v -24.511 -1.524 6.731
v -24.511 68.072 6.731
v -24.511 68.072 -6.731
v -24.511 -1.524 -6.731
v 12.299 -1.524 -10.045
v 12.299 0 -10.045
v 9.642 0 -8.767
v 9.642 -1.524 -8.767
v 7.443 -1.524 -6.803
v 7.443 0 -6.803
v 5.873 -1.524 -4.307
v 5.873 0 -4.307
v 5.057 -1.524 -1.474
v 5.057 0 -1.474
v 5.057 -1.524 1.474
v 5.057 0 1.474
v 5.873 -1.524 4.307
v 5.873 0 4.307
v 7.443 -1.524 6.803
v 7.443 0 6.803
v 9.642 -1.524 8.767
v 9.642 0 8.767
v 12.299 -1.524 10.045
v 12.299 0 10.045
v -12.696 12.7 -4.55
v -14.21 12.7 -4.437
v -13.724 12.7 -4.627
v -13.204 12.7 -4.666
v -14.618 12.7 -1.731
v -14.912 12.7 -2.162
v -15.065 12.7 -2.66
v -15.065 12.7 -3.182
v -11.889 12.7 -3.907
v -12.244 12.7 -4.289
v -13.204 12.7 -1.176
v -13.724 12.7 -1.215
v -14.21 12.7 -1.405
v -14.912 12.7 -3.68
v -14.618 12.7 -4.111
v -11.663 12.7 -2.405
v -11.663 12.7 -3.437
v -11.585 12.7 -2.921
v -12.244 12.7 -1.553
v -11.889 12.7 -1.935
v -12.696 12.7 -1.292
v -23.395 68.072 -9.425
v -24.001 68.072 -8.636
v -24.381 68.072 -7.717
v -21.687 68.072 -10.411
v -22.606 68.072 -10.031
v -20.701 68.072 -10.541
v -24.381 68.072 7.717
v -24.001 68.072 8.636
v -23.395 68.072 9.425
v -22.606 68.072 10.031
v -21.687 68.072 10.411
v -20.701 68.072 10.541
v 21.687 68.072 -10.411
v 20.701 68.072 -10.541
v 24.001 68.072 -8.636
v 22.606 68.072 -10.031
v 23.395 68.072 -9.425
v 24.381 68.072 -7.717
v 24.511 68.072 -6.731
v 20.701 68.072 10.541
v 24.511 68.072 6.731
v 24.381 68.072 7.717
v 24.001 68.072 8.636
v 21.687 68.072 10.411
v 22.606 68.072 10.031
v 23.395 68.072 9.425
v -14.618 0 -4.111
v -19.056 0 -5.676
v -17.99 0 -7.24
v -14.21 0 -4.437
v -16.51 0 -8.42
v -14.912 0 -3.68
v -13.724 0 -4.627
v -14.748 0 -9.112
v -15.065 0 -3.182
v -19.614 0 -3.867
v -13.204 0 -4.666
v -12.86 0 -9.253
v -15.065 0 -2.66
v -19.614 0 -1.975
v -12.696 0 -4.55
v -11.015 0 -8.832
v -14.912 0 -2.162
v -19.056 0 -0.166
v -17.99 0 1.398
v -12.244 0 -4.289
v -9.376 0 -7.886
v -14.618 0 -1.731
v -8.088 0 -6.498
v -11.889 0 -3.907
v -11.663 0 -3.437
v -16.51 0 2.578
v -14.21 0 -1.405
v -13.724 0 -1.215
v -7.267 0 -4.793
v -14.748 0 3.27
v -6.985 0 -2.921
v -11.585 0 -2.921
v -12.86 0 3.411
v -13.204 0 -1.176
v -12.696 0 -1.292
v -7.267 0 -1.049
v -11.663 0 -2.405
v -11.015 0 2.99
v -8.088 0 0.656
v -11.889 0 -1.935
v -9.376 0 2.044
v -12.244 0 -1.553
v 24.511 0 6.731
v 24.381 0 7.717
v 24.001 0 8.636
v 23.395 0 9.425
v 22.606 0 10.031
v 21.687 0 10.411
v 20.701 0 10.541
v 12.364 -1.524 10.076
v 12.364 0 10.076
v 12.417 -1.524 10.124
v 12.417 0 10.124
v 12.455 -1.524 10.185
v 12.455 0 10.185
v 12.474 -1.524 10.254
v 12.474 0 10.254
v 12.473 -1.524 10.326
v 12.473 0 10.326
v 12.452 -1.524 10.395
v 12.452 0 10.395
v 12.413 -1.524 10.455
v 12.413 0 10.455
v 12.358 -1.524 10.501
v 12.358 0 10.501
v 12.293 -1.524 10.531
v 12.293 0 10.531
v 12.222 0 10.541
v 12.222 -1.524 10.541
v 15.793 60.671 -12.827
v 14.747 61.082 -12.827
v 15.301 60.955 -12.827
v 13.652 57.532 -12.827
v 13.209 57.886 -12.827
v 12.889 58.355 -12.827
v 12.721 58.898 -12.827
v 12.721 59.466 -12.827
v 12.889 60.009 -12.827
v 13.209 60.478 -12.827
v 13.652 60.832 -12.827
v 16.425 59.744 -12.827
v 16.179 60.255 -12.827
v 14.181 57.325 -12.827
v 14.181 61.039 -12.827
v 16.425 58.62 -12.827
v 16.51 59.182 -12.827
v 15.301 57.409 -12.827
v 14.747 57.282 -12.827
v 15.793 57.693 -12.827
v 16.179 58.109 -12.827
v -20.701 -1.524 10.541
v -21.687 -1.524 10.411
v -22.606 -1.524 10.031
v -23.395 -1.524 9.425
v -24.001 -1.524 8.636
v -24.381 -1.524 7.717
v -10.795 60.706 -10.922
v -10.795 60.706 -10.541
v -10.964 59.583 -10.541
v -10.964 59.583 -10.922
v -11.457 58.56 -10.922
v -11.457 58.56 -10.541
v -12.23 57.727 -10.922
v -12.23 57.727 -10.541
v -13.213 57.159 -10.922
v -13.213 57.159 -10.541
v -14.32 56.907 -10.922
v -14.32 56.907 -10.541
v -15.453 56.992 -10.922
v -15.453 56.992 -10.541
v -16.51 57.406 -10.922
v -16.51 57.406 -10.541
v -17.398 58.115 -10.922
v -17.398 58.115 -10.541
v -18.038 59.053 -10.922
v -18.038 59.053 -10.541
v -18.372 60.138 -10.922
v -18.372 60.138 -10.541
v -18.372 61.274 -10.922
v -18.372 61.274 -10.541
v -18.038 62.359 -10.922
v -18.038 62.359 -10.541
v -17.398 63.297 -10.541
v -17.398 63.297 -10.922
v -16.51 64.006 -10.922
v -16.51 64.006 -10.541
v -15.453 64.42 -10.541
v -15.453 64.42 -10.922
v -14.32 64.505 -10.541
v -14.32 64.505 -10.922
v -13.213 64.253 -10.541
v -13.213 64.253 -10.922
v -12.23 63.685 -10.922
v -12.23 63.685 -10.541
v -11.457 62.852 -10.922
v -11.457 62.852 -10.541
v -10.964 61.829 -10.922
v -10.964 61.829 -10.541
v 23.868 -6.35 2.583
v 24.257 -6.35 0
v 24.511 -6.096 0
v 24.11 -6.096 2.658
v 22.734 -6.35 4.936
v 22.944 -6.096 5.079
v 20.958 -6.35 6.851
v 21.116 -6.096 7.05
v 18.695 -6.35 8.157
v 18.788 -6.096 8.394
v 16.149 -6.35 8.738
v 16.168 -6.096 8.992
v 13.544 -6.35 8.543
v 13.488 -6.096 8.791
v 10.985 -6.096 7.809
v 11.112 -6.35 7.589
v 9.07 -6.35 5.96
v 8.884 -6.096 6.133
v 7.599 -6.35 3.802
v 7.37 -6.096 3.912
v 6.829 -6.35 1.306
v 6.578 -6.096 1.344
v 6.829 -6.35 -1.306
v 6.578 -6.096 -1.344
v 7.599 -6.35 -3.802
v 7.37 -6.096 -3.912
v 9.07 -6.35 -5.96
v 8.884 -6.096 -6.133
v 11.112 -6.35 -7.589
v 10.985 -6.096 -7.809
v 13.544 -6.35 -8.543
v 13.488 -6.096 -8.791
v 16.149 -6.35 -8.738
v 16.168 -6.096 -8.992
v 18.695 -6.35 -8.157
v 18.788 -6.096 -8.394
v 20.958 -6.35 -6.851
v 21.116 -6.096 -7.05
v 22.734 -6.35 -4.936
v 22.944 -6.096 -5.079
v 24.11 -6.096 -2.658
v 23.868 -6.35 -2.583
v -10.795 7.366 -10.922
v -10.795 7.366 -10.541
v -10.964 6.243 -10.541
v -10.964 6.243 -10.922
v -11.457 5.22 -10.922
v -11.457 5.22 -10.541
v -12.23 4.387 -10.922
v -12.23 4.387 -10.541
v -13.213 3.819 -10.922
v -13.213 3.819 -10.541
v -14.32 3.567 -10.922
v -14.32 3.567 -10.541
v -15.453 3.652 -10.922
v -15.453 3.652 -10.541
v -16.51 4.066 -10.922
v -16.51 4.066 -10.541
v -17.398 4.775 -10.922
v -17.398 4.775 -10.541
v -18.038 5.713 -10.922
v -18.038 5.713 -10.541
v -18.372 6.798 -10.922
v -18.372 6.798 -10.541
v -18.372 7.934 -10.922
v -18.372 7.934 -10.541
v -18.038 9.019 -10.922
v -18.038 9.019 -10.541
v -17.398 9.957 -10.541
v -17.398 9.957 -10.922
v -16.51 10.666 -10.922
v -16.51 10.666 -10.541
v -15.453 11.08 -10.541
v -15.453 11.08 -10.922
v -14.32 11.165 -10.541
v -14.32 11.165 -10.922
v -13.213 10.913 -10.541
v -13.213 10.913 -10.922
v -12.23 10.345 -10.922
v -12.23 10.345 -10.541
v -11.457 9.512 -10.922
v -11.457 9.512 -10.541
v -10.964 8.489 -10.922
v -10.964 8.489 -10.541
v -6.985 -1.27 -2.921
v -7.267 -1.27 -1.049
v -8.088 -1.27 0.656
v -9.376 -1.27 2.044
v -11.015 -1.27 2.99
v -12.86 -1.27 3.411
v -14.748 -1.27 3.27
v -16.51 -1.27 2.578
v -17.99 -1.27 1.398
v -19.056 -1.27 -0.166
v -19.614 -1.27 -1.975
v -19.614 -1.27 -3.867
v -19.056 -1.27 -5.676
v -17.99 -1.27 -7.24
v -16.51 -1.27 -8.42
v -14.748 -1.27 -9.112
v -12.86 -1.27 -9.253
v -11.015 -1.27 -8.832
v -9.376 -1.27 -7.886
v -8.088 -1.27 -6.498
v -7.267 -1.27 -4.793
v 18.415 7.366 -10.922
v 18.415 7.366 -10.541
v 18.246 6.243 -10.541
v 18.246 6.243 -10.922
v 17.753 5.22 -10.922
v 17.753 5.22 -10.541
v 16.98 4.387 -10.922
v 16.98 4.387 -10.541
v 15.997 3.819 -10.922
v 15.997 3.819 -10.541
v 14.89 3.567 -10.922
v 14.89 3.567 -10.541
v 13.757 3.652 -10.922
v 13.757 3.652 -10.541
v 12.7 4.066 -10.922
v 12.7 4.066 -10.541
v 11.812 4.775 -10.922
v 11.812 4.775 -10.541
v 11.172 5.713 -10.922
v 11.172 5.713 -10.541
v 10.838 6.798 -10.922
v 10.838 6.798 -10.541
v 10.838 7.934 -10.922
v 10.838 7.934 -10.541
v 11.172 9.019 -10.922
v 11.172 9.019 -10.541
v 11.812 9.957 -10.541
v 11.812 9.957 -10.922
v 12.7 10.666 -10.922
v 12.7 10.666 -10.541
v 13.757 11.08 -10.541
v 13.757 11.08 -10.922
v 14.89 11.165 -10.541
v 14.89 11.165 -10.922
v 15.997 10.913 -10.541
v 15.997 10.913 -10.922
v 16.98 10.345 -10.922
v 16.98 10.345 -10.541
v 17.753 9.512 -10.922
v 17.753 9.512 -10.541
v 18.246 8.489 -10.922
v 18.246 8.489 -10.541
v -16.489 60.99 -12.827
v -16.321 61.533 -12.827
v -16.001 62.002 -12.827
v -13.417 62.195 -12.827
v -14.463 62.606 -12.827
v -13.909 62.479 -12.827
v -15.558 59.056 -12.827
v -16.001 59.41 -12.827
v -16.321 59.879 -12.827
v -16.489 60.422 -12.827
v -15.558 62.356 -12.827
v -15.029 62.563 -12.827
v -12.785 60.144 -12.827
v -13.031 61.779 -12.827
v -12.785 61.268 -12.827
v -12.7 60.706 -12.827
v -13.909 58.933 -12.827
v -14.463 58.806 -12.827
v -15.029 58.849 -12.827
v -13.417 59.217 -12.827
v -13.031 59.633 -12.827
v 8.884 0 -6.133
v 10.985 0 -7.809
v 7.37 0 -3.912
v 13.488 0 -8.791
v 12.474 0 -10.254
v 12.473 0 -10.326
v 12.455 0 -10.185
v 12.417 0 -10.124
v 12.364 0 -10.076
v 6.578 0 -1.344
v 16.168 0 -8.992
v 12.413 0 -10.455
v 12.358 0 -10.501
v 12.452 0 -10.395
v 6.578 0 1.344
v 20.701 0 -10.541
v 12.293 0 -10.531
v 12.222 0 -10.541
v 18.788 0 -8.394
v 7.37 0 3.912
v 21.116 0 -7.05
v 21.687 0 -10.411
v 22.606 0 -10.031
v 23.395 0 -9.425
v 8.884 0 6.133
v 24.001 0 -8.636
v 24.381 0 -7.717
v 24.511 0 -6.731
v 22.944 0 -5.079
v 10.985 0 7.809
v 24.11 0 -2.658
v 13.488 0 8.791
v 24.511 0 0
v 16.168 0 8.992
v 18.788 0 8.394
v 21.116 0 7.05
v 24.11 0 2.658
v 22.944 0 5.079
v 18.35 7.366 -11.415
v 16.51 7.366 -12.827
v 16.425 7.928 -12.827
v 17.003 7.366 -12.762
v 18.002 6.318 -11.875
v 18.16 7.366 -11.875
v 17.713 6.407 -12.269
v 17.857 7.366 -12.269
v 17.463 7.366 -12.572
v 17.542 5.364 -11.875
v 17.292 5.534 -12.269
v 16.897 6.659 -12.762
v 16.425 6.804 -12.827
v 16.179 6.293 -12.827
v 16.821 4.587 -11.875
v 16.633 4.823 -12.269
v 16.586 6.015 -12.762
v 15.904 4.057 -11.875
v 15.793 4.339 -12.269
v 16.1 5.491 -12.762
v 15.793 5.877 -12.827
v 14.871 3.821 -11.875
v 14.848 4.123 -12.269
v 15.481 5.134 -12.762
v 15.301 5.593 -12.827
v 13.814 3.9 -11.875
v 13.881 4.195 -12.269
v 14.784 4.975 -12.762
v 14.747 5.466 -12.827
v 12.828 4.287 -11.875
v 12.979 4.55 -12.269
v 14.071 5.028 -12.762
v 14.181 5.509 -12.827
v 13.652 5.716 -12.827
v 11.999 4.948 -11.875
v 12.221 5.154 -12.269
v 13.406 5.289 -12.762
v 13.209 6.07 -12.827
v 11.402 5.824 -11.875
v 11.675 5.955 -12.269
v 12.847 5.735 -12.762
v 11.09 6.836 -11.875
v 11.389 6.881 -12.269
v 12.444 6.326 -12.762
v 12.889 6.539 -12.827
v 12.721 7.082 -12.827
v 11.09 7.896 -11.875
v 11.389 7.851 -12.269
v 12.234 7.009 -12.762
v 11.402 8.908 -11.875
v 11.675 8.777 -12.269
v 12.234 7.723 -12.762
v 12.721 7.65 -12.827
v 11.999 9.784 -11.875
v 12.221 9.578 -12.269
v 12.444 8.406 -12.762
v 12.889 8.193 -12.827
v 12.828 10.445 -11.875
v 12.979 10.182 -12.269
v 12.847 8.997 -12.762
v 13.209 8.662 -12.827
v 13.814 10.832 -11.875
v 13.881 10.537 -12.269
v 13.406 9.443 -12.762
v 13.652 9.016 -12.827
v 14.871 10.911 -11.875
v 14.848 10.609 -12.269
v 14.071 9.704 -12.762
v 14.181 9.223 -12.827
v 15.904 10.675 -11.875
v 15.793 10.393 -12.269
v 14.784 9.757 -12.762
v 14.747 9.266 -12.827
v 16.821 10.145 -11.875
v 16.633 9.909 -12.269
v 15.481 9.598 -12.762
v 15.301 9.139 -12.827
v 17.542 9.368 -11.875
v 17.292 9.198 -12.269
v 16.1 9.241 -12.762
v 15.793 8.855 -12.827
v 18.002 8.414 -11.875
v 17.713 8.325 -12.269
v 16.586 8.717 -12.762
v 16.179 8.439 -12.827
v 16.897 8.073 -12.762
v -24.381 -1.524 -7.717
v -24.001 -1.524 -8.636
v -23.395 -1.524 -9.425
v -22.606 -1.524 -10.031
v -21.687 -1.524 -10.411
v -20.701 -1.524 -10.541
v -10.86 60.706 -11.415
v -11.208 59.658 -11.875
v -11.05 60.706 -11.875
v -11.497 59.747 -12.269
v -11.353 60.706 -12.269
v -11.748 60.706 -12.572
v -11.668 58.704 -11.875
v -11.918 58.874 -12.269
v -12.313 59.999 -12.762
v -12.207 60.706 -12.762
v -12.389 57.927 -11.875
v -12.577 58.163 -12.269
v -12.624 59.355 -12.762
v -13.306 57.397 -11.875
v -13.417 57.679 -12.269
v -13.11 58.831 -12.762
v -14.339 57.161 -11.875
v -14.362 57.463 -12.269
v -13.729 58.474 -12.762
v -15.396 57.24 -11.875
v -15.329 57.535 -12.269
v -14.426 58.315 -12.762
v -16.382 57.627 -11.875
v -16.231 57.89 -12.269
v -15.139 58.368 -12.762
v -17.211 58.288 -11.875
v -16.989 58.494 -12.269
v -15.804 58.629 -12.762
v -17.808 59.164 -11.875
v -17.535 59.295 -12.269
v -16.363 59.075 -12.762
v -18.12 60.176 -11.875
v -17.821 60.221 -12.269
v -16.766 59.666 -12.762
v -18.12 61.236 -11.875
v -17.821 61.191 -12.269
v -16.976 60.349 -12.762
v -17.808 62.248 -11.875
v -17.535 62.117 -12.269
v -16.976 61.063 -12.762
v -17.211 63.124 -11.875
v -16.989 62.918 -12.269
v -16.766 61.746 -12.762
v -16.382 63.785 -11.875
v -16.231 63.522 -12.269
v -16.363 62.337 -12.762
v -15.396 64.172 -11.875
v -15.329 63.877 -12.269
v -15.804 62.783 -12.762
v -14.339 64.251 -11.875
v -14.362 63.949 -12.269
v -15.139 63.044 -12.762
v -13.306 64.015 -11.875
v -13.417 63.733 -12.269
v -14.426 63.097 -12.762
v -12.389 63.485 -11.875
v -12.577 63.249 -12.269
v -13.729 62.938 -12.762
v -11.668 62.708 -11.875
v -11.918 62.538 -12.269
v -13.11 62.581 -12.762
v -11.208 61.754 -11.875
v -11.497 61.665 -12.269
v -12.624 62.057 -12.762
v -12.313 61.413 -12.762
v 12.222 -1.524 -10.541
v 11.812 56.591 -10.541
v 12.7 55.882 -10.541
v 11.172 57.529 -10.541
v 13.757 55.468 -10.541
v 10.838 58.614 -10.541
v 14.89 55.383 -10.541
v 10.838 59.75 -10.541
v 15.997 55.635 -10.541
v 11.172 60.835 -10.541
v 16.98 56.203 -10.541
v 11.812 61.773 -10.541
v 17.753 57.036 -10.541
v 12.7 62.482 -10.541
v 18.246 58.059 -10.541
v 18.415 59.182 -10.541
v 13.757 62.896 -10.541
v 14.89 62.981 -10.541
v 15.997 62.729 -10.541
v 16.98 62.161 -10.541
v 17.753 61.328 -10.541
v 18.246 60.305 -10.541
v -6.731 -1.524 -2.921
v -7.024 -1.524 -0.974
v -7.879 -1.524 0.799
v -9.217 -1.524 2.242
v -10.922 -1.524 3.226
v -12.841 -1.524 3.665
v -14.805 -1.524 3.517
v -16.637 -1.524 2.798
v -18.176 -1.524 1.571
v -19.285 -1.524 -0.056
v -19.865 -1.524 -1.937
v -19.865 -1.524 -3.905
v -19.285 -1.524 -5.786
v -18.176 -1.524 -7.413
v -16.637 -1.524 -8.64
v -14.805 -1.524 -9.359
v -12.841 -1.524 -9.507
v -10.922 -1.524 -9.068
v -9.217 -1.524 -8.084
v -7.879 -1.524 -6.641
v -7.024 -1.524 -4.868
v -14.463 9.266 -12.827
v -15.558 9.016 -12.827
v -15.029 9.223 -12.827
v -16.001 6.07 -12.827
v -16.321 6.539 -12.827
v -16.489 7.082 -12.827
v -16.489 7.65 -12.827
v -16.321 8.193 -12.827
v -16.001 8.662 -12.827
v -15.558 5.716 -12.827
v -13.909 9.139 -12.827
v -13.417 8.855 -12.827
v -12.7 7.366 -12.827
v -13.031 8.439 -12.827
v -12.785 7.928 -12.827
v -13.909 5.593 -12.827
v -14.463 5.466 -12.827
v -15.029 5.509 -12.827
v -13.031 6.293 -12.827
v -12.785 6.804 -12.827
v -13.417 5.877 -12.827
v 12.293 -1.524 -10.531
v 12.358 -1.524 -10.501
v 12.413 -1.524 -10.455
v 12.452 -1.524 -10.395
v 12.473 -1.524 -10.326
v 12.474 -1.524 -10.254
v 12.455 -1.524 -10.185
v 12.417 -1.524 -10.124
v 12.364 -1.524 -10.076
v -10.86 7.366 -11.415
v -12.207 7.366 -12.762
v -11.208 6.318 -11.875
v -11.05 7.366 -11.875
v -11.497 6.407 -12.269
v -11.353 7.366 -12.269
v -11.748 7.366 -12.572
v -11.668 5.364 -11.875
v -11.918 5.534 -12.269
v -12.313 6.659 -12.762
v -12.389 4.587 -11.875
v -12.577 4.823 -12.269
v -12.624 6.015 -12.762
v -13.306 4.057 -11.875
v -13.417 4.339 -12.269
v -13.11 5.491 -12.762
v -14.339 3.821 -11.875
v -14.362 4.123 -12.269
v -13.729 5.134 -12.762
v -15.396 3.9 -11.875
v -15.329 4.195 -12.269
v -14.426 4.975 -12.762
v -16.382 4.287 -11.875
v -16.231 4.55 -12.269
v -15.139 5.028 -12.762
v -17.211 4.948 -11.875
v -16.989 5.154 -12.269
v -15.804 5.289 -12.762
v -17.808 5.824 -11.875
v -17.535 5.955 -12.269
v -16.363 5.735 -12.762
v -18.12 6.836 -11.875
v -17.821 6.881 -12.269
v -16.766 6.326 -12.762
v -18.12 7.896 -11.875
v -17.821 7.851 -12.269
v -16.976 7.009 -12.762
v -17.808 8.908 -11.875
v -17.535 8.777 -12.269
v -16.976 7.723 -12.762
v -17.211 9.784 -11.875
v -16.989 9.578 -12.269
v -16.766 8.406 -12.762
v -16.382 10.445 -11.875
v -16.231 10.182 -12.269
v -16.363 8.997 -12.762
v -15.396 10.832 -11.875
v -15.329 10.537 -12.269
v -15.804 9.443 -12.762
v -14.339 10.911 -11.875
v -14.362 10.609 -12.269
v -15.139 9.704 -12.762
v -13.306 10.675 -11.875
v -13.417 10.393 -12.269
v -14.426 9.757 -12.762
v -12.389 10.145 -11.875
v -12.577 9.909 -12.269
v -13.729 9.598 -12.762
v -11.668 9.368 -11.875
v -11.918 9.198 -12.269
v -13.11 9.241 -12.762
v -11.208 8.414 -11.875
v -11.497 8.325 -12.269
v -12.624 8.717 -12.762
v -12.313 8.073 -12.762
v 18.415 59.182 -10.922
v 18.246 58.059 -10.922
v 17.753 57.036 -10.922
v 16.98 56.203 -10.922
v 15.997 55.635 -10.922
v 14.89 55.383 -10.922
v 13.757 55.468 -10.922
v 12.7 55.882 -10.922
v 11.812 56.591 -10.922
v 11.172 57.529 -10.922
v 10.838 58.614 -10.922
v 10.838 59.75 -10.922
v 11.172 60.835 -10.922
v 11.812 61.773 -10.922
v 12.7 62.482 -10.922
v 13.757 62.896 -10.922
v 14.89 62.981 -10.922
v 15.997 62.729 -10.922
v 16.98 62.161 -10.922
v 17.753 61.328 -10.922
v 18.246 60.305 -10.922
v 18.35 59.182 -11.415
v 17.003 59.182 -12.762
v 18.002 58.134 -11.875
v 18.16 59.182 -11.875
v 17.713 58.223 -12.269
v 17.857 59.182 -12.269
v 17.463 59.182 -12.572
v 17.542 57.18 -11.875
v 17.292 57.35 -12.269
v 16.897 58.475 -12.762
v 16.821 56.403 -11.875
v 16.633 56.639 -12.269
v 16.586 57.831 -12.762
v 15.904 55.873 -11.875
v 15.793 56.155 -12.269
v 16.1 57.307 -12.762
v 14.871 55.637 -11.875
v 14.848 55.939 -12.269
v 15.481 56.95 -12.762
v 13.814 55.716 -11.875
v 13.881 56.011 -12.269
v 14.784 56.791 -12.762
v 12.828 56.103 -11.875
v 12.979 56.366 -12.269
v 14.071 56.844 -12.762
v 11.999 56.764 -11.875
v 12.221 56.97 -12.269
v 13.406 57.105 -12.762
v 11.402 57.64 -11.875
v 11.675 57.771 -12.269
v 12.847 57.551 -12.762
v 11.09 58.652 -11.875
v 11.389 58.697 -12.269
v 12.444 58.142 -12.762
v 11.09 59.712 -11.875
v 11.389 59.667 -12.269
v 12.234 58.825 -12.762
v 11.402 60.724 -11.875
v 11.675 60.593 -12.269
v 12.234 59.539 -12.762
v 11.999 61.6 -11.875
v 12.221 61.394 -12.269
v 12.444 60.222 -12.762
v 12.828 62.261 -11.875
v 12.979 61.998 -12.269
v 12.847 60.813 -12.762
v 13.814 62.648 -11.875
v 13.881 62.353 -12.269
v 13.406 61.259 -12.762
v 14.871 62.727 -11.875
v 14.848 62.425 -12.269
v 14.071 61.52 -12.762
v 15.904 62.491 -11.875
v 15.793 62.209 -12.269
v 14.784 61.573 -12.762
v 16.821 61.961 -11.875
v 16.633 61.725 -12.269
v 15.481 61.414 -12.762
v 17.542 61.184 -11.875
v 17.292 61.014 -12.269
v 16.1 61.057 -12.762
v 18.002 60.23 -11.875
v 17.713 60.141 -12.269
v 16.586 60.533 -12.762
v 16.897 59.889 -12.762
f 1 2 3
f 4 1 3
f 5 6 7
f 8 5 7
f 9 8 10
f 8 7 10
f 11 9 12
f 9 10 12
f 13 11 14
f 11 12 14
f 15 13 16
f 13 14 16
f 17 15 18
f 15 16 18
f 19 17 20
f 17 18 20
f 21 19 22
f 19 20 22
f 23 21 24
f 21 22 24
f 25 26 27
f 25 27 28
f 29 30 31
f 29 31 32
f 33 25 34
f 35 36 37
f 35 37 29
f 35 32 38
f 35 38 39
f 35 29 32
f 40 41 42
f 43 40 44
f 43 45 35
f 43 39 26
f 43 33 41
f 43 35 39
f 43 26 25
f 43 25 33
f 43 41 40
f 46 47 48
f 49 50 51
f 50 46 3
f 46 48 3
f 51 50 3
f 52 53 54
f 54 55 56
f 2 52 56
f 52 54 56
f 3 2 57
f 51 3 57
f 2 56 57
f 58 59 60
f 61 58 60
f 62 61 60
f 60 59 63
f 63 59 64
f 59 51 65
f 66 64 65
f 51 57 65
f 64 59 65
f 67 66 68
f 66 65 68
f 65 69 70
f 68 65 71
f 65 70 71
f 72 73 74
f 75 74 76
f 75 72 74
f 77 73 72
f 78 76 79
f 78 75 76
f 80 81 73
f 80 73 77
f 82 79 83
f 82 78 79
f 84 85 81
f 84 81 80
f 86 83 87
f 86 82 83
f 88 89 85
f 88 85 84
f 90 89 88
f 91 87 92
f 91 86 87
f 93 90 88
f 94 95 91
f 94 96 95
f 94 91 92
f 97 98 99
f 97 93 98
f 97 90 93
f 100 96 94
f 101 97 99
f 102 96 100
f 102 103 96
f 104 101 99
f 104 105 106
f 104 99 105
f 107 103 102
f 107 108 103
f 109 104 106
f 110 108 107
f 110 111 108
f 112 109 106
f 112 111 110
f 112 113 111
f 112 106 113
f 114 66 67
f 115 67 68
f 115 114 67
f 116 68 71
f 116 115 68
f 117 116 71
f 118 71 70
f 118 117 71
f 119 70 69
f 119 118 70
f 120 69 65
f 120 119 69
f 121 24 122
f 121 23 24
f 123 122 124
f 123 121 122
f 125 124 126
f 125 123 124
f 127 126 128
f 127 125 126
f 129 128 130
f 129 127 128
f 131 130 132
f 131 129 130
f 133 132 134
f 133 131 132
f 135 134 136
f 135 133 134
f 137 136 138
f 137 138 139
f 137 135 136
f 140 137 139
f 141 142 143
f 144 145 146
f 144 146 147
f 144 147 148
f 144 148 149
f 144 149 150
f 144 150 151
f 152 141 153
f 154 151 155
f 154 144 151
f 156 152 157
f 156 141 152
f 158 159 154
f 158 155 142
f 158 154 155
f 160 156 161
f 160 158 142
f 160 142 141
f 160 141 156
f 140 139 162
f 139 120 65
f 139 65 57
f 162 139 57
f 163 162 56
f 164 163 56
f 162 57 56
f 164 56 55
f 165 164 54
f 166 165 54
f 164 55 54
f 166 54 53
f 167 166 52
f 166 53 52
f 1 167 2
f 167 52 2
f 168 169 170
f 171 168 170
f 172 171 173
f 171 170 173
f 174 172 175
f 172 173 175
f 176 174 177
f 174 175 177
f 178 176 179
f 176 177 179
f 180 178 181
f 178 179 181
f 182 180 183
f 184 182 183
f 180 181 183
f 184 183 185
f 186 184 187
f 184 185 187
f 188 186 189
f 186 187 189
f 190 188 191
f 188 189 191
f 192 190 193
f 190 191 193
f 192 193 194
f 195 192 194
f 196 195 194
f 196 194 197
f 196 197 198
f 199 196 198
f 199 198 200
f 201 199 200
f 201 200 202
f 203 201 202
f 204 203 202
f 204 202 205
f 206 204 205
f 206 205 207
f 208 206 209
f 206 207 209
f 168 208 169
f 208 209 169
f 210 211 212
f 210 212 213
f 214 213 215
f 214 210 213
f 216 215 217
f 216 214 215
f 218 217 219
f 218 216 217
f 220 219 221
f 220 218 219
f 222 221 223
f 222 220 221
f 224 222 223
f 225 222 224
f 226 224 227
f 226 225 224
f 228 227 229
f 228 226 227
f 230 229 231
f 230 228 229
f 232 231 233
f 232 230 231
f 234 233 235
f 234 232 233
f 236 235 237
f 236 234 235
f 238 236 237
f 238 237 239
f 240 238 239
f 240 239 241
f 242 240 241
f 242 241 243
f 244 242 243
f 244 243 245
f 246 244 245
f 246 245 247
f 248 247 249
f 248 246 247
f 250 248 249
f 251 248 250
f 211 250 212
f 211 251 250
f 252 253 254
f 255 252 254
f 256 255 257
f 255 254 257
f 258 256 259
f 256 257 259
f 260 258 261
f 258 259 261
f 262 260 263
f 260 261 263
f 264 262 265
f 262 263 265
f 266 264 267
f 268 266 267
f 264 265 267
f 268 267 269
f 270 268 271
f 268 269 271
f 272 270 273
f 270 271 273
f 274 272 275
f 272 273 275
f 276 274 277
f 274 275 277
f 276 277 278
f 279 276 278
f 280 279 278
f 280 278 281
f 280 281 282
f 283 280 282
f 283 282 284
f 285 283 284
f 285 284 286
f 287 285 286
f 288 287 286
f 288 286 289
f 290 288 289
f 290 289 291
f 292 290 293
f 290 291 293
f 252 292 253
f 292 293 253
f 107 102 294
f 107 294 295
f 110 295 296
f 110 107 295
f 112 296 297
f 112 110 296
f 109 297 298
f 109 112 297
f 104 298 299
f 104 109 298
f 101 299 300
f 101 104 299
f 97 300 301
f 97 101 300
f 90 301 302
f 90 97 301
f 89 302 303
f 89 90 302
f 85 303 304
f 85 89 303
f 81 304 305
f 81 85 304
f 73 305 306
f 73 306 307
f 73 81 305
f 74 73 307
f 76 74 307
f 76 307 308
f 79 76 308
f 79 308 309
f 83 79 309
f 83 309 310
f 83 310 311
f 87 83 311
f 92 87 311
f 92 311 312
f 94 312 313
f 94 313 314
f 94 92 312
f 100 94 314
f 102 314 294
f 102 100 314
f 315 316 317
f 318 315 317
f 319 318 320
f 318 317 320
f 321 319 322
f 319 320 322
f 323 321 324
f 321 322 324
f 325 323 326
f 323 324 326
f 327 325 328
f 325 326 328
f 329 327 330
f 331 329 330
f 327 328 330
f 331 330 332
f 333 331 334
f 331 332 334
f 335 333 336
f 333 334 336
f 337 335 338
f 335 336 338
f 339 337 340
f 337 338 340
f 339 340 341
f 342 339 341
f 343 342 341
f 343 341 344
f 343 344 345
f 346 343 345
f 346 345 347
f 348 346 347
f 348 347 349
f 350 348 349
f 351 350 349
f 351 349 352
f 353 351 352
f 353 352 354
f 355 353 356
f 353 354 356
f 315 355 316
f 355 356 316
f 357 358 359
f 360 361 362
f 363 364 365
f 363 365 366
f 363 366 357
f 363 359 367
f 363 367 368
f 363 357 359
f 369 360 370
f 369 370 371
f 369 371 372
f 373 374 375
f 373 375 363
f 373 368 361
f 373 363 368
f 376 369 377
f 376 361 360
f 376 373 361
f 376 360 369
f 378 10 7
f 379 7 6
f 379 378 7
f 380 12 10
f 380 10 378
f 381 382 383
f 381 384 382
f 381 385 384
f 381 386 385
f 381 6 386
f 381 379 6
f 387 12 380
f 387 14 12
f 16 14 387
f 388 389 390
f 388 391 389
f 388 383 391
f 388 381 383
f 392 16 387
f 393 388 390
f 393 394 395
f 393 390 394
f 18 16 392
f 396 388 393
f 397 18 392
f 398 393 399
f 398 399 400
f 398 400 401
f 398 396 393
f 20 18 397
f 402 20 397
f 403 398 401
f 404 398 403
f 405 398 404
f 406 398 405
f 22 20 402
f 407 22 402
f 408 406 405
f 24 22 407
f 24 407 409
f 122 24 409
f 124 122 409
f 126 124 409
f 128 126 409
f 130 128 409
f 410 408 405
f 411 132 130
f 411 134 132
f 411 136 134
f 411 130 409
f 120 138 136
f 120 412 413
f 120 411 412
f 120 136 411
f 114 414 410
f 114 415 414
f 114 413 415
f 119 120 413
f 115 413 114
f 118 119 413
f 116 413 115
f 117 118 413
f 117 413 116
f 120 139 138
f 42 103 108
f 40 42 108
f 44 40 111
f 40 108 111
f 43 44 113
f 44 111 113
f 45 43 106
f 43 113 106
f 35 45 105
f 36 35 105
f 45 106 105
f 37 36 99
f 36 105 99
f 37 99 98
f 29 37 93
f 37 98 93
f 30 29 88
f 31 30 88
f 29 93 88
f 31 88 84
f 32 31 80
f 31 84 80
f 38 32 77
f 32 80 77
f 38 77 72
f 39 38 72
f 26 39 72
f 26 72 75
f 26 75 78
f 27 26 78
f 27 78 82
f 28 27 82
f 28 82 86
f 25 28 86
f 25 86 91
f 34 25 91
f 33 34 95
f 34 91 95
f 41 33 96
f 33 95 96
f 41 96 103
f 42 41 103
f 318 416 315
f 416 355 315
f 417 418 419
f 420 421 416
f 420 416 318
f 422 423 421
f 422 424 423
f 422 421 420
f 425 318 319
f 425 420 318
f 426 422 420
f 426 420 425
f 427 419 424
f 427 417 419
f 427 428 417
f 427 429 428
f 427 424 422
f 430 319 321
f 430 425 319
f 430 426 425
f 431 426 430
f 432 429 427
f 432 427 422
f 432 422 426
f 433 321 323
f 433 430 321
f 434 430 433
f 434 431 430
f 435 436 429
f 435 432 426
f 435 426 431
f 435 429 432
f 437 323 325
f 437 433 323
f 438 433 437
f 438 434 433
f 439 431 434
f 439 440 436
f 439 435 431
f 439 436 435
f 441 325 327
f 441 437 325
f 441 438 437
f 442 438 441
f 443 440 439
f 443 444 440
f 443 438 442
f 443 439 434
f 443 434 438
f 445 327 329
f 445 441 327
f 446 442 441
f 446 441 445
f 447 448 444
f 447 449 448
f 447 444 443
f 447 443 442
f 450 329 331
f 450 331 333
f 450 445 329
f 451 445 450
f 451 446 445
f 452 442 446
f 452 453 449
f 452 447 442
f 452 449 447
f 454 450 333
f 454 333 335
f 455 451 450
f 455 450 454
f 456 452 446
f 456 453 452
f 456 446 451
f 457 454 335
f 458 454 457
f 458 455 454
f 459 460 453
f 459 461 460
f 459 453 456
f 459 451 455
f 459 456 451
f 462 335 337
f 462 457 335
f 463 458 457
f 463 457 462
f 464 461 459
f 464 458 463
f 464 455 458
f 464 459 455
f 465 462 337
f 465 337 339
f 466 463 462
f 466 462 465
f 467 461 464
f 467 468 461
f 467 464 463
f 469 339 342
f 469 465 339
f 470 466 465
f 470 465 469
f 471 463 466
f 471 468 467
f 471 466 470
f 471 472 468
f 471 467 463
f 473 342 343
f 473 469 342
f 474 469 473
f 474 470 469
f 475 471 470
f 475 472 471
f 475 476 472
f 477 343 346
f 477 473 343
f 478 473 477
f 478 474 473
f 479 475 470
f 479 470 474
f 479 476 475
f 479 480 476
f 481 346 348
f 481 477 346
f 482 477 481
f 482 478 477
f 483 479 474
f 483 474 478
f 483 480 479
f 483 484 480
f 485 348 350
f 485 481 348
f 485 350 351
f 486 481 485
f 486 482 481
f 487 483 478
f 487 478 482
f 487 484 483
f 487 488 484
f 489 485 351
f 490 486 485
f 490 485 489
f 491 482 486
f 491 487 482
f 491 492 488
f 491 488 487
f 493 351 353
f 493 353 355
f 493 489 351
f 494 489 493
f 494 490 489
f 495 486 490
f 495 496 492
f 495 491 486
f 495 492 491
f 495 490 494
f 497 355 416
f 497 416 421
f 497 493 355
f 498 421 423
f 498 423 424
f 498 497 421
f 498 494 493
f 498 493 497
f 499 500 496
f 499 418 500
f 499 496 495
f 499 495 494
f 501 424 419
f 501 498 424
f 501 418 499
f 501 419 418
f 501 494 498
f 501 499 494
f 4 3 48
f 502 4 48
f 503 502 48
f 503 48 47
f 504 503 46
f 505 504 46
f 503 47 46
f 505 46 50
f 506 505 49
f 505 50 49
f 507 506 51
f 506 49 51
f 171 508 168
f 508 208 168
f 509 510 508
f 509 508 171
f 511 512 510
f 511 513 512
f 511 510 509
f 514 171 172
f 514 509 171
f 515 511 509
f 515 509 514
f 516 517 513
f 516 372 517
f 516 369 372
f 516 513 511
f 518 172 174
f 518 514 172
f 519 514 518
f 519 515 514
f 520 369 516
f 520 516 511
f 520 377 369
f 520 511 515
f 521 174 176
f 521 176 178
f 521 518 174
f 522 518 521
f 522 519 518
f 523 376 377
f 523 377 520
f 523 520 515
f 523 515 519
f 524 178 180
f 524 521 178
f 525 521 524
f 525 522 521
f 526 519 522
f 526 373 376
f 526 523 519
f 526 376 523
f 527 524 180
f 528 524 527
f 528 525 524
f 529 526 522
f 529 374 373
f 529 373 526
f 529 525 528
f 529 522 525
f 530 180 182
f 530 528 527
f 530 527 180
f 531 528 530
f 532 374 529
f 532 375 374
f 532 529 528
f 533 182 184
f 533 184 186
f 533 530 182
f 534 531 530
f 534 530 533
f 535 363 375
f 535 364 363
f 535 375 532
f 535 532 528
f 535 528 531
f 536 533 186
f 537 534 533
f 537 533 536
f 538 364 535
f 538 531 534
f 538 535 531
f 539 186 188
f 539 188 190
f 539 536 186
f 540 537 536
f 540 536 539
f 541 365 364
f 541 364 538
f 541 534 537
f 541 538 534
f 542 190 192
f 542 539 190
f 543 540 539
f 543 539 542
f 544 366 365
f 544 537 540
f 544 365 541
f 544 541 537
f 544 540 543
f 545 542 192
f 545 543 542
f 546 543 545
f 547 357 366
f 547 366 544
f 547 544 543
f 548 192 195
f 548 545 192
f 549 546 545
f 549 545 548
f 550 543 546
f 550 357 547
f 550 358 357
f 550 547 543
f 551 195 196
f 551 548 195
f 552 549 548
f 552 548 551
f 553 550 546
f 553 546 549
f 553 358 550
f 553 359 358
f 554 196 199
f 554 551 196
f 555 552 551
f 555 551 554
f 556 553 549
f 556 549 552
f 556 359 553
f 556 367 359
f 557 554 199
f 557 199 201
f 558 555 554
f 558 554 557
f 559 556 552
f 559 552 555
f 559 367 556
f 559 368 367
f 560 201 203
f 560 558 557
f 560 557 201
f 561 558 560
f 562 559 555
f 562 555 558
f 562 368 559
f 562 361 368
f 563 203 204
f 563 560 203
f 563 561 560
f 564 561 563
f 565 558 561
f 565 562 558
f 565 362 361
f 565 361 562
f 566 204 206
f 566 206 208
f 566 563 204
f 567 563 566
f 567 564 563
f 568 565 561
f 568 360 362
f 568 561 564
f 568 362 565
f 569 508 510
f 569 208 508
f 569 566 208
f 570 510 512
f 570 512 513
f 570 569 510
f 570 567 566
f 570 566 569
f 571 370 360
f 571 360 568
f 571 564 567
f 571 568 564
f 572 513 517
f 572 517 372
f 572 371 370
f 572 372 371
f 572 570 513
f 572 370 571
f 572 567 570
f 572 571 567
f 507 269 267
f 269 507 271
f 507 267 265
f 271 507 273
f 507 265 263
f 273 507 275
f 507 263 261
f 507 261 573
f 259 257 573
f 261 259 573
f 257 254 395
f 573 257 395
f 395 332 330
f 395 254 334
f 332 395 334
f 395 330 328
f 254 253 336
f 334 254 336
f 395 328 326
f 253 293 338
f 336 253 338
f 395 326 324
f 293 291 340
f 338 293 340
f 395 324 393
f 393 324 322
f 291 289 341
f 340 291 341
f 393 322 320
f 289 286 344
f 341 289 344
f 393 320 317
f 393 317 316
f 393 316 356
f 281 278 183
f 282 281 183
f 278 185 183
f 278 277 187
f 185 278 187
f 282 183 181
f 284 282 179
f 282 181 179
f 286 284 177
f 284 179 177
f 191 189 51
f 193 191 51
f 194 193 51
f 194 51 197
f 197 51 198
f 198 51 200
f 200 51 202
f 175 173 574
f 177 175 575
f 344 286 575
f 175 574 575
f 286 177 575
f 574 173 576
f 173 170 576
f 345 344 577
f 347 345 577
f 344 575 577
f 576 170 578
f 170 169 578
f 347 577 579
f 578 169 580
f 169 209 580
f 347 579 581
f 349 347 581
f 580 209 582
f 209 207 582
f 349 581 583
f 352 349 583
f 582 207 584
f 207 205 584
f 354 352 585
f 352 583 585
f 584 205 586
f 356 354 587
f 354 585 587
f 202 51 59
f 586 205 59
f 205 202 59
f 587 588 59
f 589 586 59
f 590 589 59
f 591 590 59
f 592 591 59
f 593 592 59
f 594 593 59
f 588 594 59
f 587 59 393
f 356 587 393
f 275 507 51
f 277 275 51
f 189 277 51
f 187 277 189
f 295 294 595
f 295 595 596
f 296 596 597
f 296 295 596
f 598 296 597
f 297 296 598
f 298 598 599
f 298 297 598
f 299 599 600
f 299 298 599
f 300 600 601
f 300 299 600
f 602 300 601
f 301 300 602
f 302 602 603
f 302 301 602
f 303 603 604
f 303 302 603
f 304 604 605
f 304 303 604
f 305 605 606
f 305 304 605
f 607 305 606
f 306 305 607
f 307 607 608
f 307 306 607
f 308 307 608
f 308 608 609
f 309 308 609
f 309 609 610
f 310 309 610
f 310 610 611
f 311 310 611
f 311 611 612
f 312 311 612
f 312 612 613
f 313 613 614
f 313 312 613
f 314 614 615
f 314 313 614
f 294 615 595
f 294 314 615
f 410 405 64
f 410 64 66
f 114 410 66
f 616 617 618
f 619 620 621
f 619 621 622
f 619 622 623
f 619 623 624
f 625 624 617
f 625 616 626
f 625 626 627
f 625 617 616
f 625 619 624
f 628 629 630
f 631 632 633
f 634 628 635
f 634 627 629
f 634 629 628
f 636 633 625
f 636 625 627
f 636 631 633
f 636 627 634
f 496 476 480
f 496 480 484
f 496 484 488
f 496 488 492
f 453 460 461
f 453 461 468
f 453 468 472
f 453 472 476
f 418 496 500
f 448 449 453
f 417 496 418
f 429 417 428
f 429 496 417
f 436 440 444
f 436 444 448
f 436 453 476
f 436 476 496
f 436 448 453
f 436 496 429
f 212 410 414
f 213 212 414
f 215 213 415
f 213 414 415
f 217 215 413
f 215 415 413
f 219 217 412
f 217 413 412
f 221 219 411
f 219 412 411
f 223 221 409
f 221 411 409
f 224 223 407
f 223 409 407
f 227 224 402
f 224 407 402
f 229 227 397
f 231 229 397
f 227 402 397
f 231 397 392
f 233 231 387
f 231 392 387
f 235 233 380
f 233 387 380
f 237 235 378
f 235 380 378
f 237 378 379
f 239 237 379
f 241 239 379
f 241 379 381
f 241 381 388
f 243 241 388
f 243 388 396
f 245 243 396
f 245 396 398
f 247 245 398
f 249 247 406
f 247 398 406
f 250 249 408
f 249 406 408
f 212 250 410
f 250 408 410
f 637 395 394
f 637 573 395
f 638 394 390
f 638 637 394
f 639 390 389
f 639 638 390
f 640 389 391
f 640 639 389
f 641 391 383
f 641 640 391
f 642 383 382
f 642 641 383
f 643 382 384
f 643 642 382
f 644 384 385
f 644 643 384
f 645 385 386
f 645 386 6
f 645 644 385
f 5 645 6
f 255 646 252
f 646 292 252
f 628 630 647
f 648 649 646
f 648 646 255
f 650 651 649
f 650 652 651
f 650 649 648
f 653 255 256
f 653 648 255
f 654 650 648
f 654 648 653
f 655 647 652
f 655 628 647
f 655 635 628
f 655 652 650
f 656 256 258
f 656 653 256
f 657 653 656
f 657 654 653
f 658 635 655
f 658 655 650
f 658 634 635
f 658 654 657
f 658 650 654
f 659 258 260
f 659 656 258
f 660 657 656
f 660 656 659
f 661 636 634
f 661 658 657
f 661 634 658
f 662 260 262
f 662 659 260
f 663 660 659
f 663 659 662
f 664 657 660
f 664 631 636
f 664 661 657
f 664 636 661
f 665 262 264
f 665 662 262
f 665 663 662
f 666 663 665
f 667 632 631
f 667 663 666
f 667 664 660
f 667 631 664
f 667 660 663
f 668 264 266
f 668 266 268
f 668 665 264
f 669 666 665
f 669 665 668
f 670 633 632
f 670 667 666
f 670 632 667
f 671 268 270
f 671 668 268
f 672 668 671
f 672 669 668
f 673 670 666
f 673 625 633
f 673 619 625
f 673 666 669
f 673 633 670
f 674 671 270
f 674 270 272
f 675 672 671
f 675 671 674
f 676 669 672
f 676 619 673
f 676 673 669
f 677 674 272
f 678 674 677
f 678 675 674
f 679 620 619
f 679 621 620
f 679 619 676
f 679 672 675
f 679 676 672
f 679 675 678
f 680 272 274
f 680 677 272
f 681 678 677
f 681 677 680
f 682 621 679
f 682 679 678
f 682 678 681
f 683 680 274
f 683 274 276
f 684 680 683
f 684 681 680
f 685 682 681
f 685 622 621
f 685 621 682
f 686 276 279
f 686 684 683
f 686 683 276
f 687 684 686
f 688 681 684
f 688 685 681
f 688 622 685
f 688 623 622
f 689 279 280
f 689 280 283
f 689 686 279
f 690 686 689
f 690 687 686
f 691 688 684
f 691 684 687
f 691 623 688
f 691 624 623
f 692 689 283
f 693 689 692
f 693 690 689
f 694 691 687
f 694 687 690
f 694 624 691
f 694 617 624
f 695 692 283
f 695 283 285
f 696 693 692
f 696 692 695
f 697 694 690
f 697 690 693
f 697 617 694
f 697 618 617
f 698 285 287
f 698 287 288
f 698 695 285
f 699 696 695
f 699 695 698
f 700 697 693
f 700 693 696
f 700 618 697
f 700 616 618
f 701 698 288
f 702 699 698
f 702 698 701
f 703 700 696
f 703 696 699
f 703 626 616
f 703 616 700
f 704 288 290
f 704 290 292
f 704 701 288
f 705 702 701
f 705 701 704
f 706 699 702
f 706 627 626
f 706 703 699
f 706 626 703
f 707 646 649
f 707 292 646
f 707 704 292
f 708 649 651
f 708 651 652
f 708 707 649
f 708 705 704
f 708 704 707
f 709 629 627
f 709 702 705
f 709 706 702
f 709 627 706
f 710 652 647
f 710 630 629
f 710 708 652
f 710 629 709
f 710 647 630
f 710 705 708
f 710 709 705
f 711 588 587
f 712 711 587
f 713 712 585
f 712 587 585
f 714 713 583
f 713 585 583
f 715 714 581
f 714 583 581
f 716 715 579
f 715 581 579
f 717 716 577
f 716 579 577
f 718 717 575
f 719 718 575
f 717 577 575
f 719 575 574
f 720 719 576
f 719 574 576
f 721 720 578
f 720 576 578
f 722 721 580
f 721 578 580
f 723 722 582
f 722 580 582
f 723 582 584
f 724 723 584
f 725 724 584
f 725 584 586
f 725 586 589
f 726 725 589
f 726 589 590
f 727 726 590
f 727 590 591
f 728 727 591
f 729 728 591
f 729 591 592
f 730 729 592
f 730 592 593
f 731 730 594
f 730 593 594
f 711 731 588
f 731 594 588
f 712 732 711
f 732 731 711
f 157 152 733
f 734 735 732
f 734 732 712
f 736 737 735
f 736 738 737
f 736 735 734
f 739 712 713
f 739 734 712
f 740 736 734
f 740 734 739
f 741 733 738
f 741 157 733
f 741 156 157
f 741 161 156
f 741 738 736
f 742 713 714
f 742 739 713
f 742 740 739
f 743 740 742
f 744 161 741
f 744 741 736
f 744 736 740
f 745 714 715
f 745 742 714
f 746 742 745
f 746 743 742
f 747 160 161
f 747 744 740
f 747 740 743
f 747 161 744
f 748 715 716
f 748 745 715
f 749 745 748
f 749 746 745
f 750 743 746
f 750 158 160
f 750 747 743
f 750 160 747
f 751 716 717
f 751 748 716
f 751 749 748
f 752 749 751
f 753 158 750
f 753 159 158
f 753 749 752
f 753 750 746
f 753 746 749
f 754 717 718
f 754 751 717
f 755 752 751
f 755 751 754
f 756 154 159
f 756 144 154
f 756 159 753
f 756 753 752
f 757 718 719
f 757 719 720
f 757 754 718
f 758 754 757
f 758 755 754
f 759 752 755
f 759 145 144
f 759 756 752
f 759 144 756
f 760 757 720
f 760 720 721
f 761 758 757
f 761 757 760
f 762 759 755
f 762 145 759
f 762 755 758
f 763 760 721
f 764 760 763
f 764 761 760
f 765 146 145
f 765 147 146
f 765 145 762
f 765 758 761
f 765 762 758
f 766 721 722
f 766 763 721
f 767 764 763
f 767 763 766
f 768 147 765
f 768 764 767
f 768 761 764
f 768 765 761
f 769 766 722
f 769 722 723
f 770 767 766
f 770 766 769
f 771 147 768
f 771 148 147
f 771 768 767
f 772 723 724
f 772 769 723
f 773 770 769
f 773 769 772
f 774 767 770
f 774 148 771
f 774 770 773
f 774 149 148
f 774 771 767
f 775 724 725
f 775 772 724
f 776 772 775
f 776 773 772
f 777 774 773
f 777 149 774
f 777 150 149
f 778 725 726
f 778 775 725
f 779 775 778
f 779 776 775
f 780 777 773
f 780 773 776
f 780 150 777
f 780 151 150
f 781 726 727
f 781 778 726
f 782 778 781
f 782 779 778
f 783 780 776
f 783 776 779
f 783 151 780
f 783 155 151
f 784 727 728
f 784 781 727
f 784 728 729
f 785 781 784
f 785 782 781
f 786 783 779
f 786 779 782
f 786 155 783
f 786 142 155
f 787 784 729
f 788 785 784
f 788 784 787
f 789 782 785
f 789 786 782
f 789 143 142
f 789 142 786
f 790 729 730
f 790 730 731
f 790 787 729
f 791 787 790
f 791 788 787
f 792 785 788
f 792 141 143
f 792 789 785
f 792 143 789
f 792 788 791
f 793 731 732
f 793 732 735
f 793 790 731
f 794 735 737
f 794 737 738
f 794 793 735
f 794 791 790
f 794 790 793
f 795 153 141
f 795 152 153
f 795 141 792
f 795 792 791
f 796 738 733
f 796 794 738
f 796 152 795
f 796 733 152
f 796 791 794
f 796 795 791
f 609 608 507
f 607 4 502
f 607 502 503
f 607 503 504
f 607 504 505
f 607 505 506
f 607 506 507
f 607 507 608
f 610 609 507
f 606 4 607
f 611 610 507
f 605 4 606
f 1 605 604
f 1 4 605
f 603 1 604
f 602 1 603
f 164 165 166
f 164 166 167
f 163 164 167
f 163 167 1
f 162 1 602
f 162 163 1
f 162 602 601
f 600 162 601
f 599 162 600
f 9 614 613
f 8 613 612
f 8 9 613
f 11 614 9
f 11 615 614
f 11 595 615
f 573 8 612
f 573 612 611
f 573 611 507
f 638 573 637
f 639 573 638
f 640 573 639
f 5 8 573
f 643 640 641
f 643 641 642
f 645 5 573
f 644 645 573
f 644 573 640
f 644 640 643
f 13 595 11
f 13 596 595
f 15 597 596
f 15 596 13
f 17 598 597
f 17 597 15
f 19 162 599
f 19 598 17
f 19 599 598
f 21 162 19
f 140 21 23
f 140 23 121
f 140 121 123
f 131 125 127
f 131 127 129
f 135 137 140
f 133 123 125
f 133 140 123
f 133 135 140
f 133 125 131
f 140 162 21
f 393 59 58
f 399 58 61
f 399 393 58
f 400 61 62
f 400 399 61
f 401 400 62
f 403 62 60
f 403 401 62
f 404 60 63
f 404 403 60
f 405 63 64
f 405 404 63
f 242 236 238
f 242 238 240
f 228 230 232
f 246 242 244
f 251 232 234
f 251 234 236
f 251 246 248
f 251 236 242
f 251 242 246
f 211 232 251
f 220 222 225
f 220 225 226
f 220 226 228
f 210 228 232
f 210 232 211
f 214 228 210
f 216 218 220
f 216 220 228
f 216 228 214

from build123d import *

# Parameters (mm, degrees)
F0_R     = 6.35
F0_R_2   = 9.017
F0_R_3   = 1.75
F1_DEPTH = 68.072
F2_DEPTH = 6.35
F3_DEPTH = 1.524
F4_DEPTH = 12.7
F5_R     = 0.2539
F6_SIZE  = 0.254
F7_R     = 3.81
F8_DEPTH = 2.286
F9_R     = 1.905


# Not quite as in the source:
# - a fillet or chamfer is up to 0.001 mm smaller than in the source, because OpenCascade refuses the exact size


with BuildPart() as f1:
    # F0 (on Front) → F1 (new body)
    with BuildSketch(Plane.XZ):
        with BuildLine():
            Line((-20.701, -10.541), (15.494, -10.541))
            ThreePointArc((15.494, -10.541), (4.953, 0), (15.494, 10.541))
            Line((15.494, 10.541), (-20.701, 10.541))
            ThreePointArc((-20.701, 10.541), (-23.3950768363, 9.4250768363), (-24.511, 6.731))
            Line((-24.511, 6.731), (-24.511, -6.731))
            ThreePointArc((-24.511, -6.731), (-23.3950768363, -9.4250768363), (-20.701, -10.541))
        make_face()
        with Locations((-13.335, -2.921)):
            Circle(F0_R, mode=Mode.SUBTRACT)
        with BuildLine():
            Line((15.494, -10.541), (20.701, -10.541))
            ThreePointArc((20.701, -10.541), (23.3950768363, -9.4250768363), (24.511, -6.731))
            Line((24.511, -6.731), (24.511, 0))
            Line((24.511, 0), (24.511, 6.731))
            ThreePointArc((24.511, 6.731), (23.3950768363, 9.4250768363), (20.701, 10.541))
            Line((20.701, 10.541), (15.494, 10.541))
            ThreePointArc((15.494, 10.541), (4.953, 0), (15.494, -10.541))
        make_face()
        with Locations((15.494, 0)):
            Circle(F0_R_2, mode=Mode.SUBTRACT)
        with Locations((15.494, 0)):
            Circle(F0_R_2)
        with Locations((-13.335, -2.921)):
            Circle(F0_R)
        with Locations((-13.335, -2.921)):
            Circle(F0_R_3, mode=Mode.SUBTRACT)
        with Locations((-13.335, -2.921)):
            Circle(F0_R_3)
    extrude(amount=-F1_DEPTH)

    # F0 (on Front) → F2 (join)
    with BuildSketch(Plane.XZ):
        with Locations((15.494, 0)):
            Circle(F0_R_2)
    extrude(amount=F2_DEPTH)

    # F0 (on Front) → F3 (join)
    with BuildSketch(Plane.XZ):
        with BuildLine():
            Line((-20.701, -10.541), (15.494, -10.541))
            ThreePointArc((15.494, -10.541), (4.953, 0), (15.494, 10.541))
            Line((15.494, 10.541), (-20.701, 10.541))
            ThreePointArc((-20.701, 10.541), (-23.3950768363, 9.4250768363), (-24.511, 6.731))
            Line((-24.511, 6.731), (-24.511, -6.731))
            ThreePointArc((-24.511, -6.731), (-23.3950768363, -9.4250768363), (-20.701, -10.541))
        make_face()
        with Locations((-13.335, -2.921)):
            Circle(F0_R, mode=Mode.SUBTRACT)
    extrude(amount=F3_DEPTH)

    # F0 (on Front) → F4 (cut)
    with BuildSketch(Plane.XZ):
        with Locations((-13.335, -2.921)):
            Circle(F0_R_3)
    extrude(amount=-F4_DEPTH, mode=Mode.SUBTRACT)

    # F5 (radius 0.254 in the source; OpenCascade refuses exactly that, so slightly less here)
    f5_edges = [f1.edges().sort_by_distance(p)[0] for p in [
        (15.494, -0.762, 10.541),
        (15.494, -0.762, -10.541),
    ]]
    fillet(f5_edges, radius=F5_R)

    # F6
    f6_edges = [f1.edges().sort_by_distance(p)[0] for p in [
        (6.477, -6.35, 0),
        (-19.685, -1.524, -2.921),
    ]]
    chamfer(f6_edges, length=F6_SIZE)

    # F7 (on face) → F8 (join)
    with BuildSketch(Plane(origin=(0, 0, -10.541), x_dir=(1, 0, 0), z_dir=(0, 0, -1))):
        with Locations((-14.605, -7.366)):
            Circle(F7_R)
        with Locations((14.605, -7.366)):
            Circle(F7_R)
        with Locations((-14.605, -60.706)):
            Circle(F7_R)
        with Locations((14.605, -59.182)):
            Circle(F7_R)
    extrude(amount=F8_DEPTH)

    # F9
    f9_edges = [f1.edges().sort_by_distance(p)[0] for p in [
        (-18.415, 7.366, -12.827),
        (10.795, 7.366, -12.827),
        (10.795, 59.182, -12.827),
        (-18.415, 60.706, -12.827),
    ]]
    fillet(f9_edges, radius=F9_R)


solid = f1.part
